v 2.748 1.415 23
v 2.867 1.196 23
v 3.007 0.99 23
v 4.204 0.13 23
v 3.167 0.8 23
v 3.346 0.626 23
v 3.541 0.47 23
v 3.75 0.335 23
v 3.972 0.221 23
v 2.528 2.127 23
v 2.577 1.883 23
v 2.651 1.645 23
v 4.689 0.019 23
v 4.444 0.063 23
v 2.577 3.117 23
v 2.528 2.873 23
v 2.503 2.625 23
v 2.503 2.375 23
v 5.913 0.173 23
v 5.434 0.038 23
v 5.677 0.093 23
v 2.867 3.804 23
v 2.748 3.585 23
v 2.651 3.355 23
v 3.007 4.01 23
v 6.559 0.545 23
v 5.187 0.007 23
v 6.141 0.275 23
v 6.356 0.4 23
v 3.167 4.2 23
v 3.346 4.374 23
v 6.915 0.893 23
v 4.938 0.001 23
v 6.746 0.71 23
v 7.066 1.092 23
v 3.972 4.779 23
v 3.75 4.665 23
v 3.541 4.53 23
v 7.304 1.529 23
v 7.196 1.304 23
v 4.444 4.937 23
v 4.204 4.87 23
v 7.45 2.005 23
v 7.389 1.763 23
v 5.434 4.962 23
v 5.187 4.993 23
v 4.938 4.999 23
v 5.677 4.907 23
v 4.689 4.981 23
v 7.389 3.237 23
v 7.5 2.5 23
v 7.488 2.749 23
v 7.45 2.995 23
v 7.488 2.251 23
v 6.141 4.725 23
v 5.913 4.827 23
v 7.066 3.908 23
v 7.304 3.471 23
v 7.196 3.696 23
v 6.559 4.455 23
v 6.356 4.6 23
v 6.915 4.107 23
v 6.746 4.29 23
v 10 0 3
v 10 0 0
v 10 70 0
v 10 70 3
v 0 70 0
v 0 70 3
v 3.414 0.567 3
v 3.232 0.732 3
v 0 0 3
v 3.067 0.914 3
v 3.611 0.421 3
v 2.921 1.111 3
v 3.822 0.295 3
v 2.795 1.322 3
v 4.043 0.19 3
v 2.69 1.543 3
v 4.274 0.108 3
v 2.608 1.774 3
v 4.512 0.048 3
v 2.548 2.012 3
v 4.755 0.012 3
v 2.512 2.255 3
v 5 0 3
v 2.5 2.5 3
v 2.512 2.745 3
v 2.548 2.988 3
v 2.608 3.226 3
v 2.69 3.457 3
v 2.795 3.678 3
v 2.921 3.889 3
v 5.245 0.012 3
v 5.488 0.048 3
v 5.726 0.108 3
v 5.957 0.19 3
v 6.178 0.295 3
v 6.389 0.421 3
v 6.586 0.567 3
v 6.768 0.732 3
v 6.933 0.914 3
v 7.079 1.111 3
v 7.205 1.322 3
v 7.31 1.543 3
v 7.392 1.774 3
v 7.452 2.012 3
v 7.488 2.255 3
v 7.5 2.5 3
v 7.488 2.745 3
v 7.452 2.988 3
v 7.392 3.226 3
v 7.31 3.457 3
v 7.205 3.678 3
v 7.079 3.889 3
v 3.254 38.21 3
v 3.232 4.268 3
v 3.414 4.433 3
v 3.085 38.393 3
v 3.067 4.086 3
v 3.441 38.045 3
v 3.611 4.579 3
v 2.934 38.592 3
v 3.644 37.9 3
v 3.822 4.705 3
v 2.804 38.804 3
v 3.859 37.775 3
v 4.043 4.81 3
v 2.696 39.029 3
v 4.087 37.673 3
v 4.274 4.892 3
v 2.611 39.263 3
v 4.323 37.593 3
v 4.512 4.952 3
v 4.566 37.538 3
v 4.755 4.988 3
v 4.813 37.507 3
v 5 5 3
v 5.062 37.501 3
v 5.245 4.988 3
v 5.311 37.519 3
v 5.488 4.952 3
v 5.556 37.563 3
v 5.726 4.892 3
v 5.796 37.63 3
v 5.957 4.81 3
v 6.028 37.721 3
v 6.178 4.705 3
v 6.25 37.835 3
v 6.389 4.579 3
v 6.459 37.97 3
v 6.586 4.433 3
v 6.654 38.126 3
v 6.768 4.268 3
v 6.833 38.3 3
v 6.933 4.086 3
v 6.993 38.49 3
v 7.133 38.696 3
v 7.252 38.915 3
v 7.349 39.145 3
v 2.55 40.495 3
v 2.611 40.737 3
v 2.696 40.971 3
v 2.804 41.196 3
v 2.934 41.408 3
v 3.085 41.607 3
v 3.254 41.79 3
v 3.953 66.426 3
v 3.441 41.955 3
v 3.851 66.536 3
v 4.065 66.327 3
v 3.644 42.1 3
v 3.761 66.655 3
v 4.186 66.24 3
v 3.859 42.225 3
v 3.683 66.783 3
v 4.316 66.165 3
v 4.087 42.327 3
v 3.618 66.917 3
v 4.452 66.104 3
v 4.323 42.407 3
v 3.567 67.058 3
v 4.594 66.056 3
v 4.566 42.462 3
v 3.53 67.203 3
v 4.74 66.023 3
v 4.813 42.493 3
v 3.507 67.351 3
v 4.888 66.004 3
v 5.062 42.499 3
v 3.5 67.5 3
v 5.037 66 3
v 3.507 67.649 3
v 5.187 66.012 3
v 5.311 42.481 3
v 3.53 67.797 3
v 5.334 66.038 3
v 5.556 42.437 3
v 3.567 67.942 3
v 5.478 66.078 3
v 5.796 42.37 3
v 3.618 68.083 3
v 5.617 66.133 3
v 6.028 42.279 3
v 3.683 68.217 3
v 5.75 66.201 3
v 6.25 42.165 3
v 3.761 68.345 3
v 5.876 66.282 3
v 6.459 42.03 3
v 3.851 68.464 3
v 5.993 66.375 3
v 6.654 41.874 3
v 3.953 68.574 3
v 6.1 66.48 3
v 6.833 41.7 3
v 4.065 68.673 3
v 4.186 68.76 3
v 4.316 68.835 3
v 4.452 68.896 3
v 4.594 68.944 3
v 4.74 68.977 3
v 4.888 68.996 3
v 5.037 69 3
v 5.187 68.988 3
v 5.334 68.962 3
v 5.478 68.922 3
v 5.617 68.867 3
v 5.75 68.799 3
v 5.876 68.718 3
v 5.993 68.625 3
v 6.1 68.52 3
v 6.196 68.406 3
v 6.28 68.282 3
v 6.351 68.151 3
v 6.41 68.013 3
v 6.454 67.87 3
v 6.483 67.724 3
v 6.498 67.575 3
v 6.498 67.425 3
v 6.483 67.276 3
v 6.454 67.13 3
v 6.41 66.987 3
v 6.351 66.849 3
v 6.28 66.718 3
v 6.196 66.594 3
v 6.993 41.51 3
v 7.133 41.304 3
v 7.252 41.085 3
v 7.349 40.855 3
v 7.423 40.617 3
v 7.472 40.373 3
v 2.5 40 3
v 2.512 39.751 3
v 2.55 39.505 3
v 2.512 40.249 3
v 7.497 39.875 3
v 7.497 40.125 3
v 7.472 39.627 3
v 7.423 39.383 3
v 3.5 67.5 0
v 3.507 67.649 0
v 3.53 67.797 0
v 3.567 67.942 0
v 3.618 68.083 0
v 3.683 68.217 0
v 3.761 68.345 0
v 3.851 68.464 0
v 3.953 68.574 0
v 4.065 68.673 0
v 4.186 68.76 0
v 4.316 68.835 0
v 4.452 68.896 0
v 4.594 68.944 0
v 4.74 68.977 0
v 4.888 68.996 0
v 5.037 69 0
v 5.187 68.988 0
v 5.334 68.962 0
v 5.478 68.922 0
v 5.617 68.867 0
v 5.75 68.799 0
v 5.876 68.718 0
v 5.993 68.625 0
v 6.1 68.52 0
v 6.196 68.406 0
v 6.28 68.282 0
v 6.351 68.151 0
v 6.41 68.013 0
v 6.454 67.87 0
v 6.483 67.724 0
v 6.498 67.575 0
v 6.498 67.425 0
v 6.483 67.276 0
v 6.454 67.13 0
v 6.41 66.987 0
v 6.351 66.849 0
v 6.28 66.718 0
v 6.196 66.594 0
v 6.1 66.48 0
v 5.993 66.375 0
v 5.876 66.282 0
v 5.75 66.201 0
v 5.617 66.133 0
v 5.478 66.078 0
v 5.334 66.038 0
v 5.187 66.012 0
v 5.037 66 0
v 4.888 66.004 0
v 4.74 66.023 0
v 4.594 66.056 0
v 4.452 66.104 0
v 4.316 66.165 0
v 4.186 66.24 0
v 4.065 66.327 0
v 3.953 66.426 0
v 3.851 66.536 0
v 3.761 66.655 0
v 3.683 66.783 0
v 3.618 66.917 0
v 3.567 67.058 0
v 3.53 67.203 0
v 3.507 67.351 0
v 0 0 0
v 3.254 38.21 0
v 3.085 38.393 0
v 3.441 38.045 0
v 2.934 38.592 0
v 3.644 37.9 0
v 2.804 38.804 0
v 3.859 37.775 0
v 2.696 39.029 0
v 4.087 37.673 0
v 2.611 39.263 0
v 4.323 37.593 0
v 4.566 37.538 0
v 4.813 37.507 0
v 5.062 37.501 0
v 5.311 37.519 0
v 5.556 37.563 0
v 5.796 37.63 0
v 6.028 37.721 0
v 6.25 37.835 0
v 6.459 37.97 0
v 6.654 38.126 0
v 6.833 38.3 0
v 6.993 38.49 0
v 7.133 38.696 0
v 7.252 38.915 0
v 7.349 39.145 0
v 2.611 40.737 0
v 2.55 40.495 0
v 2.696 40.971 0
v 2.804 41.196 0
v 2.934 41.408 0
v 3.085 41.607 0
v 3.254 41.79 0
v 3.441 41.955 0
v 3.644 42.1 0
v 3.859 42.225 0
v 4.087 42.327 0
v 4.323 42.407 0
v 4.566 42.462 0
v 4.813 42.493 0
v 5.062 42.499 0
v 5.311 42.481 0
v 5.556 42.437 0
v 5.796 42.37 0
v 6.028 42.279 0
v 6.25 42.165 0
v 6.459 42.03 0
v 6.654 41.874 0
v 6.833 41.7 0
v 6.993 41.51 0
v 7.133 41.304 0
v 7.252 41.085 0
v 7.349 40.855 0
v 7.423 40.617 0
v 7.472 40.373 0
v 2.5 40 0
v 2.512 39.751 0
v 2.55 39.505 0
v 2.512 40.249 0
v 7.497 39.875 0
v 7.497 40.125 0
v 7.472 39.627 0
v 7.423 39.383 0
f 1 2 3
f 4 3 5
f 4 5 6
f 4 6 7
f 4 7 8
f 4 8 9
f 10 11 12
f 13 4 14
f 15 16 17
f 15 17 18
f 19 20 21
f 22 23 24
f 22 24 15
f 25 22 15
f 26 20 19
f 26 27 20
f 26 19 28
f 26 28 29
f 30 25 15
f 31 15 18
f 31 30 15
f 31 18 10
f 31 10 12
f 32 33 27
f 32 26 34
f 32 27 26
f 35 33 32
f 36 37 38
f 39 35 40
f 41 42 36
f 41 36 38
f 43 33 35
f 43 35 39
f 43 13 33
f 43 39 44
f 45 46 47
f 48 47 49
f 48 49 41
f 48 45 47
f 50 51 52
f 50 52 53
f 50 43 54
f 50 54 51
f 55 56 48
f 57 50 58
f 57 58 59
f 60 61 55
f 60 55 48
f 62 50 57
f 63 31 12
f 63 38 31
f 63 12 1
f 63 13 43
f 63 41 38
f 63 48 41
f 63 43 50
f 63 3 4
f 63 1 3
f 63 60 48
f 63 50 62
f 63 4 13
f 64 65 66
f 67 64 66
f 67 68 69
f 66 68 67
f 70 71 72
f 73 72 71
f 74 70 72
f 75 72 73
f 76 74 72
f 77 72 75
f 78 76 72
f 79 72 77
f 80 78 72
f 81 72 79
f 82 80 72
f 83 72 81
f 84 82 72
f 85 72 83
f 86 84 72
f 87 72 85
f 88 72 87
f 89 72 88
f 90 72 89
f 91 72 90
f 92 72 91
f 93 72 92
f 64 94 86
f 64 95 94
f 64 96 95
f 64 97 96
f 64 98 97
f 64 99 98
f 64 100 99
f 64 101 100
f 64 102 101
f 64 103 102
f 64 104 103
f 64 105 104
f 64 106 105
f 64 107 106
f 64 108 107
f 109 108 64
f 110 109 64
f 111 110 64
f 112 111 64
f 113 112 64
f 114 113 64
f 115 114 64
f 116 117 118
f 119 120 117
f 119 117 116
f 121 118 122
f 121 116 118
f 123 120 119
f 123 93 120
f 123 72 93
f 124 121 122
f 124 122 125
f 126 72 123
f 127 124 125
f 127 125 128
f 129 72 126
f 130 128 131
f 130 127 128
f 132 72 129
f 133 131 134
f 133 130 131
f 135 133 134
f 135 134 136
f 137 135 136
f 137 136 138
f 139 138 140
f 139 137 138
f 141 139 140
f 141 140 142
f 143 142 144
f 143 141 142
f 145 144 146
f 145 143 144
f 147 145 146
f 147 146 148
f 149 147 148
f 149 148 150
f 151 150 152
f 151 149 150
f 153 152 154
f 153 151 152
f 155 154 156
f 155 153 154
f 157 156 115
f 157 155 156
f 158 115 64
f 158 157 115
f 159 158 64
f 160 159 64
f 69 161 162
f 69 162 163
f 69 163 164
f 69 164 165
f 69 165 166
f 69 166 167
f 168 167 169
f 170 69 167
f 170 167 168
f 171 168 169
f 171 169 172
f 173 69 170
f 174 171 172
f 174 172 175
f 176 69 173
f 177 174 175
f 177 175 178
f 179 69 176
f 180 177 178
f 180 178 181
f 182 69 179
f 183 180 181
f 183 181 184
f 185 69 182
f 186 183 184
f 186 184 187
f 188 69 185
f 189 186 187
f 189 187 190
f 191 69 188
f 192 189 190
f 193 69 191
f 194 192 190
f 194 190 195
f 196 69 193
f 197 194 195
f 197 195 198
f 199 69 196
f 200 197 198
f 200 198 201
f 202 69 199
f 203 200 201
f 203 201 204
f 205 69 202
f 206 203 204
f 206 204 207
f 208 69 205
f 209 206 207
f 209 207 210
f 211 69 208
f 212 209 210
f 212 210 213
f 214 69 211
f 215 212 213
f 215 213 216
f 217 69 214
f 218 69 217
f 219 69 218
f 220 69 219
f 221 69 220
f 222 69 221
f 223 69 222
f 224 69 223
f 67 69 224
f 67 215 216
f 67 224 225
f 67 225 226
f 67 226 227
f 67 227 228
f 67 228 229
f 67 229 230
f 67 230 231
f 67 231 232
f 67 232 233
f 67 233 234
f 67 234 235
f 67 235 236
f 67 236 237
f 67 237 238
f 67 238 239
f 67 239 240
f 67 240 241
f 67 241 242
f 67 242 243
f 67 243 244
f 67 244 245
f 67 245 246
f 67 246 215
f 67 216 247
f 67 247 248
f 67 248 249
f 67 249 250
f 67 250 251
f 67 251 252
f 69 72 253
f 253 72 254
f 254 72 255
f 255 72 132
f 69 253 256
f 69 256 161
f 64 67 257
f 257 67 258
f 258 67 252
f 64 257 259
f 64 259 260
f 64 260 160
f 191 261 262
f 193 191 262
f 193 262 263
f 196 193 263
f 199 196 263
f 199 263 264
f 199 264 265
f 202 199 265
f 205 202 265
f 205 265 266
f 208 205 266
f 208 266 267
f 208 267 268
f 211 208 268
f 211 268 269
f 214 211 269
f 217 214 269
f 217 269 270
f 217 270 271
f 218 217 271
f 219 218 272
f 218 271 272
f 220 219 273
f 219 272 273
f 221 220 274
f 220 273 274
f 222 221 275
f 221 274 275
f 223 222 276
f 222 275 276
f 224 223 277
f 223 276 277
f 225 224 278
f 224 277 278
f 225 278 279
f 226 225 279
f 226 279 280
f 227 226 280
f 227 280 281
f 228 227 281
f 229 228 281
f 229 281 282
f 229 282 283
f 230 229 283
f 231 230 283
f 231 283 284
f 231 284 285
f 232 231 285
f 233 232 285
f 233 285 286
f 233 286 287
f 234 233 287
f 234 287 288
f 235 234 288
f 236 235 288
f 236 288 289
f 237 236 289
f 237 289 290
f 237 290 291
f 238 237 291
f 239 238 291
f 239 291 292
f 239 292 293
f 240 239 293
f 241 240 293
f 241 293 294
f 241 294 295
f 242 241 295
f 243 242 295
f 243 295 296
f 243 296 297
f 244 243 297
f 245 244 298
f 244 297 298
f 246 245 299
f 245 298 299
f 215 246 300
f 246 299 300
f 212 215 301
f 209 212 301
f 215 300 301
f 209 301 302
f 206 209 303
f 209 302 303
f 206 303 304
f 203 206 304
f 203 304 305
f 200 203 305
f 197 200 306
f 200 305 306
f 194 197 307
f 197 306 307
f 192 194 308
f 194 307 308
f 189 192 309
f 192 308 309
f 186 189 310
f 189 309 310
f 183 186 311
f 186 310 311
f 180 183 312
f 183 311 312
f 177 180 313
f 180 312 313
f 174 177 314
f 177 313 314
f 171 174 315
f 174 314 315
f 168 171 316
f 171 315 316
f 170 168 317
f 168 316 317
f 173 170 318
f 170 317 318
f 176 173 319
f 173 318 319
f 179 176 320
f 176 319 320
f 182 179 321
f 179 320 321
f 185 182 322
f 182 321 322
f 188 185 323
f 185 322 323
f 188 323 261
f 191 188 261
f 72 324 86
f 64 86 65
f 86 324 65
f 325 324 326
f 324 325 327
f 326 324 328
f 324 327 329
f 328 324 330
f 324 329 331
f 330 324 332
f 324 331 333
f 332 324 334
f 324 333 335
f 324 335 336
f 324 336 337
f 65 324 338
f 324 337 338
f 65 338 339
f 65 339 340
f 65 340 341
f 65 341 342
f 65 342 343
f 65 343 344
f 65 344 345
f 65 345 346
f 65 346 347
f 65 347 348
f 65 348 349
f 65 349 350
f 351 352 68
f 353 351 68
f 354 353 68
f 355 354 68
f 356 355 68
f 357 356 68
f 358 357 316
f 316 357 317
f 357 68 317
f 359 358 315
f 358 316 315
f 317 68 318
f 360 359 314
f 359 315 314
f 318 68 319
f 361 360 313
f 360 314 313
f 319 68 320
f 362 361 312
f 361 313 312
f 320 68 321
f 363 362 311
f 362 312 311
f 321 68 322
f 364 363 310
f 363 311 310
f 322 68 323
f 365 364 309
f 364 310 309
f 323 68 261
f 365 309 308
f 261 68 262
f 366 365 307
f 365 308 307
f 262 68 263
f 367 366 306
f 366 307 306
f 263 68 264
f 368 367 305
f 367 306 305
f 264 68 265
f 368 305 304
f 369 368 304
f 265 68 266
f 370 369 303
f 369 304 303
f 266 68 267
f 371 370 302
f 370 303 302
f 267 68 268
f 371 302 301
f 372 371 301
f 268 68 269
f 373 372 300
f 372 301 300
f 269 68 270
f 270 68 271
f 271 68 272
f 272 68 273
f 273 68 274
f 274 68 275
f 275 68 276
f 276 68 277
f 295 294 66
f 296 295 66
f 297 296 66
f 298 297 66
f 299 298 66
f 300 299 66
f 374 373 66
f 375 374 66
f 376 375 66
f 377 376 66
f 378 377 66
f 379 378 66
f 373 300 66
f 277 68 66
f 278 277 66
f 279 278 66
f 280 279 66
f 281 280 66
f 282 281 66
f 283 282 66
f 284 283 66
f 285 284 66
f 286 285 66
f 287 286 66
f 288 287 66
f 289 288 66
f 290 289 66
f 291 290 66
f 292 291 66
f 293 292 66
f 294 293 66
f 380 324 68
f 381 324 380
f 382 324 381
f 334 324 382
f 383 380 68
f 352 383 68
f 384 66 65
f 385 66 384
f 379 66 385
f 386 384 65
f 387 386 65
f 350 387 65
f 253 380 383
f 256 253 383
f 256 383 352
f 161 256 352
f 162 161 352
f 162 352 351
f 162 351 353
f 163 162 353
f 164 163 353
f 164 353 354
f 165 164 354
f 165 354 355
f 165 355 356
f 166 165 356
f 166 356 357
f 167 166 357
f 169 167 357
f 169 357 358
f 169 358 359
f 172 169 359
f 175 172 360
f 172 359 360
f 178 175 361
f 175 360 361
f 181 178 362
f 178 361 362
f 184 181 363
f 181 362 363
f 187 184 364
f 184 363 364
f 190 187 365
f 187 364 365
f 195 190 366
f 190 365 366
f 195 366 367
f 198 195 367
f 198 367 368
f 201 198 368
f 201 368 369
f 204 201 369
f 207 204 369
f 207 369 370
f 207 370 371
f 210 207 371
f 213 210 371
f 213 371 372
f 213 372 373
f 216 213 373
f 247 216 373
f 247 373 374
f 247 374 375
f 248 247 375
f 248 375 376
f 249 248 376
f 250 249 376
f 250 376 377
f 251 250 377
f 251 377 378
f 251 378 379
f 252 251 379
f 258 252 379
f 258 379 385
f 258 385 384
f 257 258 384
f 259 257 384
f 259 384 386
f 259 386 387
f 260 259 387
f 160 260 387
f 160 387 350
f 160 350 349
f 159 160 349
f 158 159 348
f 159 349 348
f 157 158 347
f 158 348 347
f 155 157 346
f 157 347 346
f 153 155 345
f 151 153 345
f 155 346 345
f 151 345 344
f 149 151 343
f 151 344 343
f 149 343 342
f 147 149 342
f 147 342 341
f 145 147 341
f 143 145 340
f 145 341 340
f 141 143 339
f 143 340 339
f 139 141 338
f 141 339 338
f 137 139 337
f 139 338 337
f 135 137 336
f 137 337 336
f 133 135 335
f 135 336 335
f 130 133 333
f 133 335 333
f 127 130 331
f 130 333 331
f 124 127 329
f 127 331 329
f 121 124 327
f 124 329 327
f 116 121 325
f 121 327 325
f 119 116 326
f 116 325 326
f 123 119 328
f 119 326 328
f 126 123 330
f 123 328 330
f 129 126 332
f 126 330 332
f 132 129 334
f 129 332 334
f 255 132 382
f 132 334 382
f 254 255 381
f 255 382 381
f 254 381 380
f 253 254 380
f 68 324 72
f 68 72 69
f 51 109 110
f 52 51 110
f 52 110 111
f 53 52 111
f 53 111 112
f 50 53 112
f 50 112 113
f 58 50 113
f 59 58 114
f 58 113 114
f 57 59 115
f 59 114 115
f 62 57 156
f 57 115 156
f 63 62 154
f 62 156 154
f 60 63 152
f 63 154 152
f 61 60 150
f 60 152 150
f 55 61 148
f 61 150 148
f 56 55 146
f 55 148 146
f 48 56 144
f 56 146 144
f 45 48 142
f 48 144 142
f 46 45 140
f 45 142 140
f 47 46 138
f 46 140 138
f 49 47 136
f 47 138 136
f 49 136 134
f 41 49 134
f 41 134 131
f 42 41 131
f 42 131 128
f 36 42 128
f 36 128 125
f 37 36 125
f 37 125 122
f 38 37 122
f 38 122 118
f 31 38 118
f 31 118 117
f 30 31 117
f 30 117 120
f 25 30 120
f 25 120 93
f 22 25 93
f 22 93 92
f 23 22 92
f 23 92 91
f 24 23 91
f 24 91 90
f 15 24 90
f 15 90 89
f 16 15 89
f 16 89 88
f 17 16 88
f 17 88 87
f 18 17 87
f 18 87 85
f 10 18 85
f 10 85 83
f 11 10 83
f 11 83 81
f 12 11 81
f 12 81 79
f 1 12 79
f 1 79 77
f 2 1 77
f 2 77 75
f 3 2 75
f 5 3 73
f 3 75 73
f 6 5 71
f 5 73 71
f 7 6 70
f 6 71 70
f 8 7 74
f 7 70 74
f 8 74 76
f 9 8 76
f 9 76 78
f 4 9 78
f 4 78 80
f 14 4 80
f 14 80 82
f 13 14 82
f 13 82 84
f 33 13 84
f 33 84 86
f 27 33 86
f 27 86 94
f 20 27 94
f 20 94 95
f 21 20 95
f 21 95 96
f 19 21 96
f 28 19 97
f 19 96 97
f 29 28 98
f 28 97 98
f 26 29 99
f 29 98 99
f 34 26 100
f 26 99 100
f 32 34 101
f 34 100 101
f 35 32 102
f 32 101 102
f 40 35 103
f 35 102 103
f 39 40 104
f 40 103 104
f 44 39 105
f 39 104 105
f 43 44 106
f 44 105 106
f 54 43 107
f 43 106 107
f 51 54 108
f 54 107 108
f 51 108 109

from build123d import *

# Parameters (mm, degrees)
SKETCH1_W           = 10
SKETCH1_H           = 70
BOSS_EXTRUDE1_DEPTH = 3
SKETCH2_R           = 2.5
BOSS_EXTRUDE2_DEPTH = 20
SKETCH4_R           = 1.5
CUT_EXTRUDE1_DEPTH  = 20
SKETCH3_R           = 2.5
CUT_EXTRUDE3_DEPTH  = 20


with BuildPart() as part:
    # Sketch1 → Boss-Extrude1 (new body)
    with BuildSketch(Plane.XY):
        with Locations((5, 35)):
            Rectangle(SKETCH1_W, SKETCH1_H)
    extrude(amount=BOSS_EXTRUDE1_DEPTH)

    # Sketch2 → Boss-Extrude2 (add)
    with BuildSketch(Plane.XY.offset(3)):
        with Locations((5, 2.5)):
            Circle(SKETCH2_R)
    extrude(amount=BOSS_EXTRUDE2_DEPTH)

    # Sketch4 → Cut-Extrude1 (cut)
    with BuildSketch(Plane(origin=(0, 0, 0), x_dir=(-1, 0, 0), z_dir=(0, 0, -1))):
        with Locations((-5, 67.5)):
            Circle(SKETCH4_R)
    extrude(amount=-CUT_EXTRUDE1_DEPTH, mode=Mode.SUBTRACT)

    # Sketch3 → Cut-Extrude3 (cut)
    with BuildSketch(Plane(origin=(0, 0, 0), x_dir=(-1, 0, 0), z_dir=(0, 0, -1))):
        with Locations((-5, 40)):
            Circle(SKETCH3_R)
    extrude(amount=-CUT_EXTRUDE3_DEPTH, mode=Mode.SUBTRACT)


solid = part.part
